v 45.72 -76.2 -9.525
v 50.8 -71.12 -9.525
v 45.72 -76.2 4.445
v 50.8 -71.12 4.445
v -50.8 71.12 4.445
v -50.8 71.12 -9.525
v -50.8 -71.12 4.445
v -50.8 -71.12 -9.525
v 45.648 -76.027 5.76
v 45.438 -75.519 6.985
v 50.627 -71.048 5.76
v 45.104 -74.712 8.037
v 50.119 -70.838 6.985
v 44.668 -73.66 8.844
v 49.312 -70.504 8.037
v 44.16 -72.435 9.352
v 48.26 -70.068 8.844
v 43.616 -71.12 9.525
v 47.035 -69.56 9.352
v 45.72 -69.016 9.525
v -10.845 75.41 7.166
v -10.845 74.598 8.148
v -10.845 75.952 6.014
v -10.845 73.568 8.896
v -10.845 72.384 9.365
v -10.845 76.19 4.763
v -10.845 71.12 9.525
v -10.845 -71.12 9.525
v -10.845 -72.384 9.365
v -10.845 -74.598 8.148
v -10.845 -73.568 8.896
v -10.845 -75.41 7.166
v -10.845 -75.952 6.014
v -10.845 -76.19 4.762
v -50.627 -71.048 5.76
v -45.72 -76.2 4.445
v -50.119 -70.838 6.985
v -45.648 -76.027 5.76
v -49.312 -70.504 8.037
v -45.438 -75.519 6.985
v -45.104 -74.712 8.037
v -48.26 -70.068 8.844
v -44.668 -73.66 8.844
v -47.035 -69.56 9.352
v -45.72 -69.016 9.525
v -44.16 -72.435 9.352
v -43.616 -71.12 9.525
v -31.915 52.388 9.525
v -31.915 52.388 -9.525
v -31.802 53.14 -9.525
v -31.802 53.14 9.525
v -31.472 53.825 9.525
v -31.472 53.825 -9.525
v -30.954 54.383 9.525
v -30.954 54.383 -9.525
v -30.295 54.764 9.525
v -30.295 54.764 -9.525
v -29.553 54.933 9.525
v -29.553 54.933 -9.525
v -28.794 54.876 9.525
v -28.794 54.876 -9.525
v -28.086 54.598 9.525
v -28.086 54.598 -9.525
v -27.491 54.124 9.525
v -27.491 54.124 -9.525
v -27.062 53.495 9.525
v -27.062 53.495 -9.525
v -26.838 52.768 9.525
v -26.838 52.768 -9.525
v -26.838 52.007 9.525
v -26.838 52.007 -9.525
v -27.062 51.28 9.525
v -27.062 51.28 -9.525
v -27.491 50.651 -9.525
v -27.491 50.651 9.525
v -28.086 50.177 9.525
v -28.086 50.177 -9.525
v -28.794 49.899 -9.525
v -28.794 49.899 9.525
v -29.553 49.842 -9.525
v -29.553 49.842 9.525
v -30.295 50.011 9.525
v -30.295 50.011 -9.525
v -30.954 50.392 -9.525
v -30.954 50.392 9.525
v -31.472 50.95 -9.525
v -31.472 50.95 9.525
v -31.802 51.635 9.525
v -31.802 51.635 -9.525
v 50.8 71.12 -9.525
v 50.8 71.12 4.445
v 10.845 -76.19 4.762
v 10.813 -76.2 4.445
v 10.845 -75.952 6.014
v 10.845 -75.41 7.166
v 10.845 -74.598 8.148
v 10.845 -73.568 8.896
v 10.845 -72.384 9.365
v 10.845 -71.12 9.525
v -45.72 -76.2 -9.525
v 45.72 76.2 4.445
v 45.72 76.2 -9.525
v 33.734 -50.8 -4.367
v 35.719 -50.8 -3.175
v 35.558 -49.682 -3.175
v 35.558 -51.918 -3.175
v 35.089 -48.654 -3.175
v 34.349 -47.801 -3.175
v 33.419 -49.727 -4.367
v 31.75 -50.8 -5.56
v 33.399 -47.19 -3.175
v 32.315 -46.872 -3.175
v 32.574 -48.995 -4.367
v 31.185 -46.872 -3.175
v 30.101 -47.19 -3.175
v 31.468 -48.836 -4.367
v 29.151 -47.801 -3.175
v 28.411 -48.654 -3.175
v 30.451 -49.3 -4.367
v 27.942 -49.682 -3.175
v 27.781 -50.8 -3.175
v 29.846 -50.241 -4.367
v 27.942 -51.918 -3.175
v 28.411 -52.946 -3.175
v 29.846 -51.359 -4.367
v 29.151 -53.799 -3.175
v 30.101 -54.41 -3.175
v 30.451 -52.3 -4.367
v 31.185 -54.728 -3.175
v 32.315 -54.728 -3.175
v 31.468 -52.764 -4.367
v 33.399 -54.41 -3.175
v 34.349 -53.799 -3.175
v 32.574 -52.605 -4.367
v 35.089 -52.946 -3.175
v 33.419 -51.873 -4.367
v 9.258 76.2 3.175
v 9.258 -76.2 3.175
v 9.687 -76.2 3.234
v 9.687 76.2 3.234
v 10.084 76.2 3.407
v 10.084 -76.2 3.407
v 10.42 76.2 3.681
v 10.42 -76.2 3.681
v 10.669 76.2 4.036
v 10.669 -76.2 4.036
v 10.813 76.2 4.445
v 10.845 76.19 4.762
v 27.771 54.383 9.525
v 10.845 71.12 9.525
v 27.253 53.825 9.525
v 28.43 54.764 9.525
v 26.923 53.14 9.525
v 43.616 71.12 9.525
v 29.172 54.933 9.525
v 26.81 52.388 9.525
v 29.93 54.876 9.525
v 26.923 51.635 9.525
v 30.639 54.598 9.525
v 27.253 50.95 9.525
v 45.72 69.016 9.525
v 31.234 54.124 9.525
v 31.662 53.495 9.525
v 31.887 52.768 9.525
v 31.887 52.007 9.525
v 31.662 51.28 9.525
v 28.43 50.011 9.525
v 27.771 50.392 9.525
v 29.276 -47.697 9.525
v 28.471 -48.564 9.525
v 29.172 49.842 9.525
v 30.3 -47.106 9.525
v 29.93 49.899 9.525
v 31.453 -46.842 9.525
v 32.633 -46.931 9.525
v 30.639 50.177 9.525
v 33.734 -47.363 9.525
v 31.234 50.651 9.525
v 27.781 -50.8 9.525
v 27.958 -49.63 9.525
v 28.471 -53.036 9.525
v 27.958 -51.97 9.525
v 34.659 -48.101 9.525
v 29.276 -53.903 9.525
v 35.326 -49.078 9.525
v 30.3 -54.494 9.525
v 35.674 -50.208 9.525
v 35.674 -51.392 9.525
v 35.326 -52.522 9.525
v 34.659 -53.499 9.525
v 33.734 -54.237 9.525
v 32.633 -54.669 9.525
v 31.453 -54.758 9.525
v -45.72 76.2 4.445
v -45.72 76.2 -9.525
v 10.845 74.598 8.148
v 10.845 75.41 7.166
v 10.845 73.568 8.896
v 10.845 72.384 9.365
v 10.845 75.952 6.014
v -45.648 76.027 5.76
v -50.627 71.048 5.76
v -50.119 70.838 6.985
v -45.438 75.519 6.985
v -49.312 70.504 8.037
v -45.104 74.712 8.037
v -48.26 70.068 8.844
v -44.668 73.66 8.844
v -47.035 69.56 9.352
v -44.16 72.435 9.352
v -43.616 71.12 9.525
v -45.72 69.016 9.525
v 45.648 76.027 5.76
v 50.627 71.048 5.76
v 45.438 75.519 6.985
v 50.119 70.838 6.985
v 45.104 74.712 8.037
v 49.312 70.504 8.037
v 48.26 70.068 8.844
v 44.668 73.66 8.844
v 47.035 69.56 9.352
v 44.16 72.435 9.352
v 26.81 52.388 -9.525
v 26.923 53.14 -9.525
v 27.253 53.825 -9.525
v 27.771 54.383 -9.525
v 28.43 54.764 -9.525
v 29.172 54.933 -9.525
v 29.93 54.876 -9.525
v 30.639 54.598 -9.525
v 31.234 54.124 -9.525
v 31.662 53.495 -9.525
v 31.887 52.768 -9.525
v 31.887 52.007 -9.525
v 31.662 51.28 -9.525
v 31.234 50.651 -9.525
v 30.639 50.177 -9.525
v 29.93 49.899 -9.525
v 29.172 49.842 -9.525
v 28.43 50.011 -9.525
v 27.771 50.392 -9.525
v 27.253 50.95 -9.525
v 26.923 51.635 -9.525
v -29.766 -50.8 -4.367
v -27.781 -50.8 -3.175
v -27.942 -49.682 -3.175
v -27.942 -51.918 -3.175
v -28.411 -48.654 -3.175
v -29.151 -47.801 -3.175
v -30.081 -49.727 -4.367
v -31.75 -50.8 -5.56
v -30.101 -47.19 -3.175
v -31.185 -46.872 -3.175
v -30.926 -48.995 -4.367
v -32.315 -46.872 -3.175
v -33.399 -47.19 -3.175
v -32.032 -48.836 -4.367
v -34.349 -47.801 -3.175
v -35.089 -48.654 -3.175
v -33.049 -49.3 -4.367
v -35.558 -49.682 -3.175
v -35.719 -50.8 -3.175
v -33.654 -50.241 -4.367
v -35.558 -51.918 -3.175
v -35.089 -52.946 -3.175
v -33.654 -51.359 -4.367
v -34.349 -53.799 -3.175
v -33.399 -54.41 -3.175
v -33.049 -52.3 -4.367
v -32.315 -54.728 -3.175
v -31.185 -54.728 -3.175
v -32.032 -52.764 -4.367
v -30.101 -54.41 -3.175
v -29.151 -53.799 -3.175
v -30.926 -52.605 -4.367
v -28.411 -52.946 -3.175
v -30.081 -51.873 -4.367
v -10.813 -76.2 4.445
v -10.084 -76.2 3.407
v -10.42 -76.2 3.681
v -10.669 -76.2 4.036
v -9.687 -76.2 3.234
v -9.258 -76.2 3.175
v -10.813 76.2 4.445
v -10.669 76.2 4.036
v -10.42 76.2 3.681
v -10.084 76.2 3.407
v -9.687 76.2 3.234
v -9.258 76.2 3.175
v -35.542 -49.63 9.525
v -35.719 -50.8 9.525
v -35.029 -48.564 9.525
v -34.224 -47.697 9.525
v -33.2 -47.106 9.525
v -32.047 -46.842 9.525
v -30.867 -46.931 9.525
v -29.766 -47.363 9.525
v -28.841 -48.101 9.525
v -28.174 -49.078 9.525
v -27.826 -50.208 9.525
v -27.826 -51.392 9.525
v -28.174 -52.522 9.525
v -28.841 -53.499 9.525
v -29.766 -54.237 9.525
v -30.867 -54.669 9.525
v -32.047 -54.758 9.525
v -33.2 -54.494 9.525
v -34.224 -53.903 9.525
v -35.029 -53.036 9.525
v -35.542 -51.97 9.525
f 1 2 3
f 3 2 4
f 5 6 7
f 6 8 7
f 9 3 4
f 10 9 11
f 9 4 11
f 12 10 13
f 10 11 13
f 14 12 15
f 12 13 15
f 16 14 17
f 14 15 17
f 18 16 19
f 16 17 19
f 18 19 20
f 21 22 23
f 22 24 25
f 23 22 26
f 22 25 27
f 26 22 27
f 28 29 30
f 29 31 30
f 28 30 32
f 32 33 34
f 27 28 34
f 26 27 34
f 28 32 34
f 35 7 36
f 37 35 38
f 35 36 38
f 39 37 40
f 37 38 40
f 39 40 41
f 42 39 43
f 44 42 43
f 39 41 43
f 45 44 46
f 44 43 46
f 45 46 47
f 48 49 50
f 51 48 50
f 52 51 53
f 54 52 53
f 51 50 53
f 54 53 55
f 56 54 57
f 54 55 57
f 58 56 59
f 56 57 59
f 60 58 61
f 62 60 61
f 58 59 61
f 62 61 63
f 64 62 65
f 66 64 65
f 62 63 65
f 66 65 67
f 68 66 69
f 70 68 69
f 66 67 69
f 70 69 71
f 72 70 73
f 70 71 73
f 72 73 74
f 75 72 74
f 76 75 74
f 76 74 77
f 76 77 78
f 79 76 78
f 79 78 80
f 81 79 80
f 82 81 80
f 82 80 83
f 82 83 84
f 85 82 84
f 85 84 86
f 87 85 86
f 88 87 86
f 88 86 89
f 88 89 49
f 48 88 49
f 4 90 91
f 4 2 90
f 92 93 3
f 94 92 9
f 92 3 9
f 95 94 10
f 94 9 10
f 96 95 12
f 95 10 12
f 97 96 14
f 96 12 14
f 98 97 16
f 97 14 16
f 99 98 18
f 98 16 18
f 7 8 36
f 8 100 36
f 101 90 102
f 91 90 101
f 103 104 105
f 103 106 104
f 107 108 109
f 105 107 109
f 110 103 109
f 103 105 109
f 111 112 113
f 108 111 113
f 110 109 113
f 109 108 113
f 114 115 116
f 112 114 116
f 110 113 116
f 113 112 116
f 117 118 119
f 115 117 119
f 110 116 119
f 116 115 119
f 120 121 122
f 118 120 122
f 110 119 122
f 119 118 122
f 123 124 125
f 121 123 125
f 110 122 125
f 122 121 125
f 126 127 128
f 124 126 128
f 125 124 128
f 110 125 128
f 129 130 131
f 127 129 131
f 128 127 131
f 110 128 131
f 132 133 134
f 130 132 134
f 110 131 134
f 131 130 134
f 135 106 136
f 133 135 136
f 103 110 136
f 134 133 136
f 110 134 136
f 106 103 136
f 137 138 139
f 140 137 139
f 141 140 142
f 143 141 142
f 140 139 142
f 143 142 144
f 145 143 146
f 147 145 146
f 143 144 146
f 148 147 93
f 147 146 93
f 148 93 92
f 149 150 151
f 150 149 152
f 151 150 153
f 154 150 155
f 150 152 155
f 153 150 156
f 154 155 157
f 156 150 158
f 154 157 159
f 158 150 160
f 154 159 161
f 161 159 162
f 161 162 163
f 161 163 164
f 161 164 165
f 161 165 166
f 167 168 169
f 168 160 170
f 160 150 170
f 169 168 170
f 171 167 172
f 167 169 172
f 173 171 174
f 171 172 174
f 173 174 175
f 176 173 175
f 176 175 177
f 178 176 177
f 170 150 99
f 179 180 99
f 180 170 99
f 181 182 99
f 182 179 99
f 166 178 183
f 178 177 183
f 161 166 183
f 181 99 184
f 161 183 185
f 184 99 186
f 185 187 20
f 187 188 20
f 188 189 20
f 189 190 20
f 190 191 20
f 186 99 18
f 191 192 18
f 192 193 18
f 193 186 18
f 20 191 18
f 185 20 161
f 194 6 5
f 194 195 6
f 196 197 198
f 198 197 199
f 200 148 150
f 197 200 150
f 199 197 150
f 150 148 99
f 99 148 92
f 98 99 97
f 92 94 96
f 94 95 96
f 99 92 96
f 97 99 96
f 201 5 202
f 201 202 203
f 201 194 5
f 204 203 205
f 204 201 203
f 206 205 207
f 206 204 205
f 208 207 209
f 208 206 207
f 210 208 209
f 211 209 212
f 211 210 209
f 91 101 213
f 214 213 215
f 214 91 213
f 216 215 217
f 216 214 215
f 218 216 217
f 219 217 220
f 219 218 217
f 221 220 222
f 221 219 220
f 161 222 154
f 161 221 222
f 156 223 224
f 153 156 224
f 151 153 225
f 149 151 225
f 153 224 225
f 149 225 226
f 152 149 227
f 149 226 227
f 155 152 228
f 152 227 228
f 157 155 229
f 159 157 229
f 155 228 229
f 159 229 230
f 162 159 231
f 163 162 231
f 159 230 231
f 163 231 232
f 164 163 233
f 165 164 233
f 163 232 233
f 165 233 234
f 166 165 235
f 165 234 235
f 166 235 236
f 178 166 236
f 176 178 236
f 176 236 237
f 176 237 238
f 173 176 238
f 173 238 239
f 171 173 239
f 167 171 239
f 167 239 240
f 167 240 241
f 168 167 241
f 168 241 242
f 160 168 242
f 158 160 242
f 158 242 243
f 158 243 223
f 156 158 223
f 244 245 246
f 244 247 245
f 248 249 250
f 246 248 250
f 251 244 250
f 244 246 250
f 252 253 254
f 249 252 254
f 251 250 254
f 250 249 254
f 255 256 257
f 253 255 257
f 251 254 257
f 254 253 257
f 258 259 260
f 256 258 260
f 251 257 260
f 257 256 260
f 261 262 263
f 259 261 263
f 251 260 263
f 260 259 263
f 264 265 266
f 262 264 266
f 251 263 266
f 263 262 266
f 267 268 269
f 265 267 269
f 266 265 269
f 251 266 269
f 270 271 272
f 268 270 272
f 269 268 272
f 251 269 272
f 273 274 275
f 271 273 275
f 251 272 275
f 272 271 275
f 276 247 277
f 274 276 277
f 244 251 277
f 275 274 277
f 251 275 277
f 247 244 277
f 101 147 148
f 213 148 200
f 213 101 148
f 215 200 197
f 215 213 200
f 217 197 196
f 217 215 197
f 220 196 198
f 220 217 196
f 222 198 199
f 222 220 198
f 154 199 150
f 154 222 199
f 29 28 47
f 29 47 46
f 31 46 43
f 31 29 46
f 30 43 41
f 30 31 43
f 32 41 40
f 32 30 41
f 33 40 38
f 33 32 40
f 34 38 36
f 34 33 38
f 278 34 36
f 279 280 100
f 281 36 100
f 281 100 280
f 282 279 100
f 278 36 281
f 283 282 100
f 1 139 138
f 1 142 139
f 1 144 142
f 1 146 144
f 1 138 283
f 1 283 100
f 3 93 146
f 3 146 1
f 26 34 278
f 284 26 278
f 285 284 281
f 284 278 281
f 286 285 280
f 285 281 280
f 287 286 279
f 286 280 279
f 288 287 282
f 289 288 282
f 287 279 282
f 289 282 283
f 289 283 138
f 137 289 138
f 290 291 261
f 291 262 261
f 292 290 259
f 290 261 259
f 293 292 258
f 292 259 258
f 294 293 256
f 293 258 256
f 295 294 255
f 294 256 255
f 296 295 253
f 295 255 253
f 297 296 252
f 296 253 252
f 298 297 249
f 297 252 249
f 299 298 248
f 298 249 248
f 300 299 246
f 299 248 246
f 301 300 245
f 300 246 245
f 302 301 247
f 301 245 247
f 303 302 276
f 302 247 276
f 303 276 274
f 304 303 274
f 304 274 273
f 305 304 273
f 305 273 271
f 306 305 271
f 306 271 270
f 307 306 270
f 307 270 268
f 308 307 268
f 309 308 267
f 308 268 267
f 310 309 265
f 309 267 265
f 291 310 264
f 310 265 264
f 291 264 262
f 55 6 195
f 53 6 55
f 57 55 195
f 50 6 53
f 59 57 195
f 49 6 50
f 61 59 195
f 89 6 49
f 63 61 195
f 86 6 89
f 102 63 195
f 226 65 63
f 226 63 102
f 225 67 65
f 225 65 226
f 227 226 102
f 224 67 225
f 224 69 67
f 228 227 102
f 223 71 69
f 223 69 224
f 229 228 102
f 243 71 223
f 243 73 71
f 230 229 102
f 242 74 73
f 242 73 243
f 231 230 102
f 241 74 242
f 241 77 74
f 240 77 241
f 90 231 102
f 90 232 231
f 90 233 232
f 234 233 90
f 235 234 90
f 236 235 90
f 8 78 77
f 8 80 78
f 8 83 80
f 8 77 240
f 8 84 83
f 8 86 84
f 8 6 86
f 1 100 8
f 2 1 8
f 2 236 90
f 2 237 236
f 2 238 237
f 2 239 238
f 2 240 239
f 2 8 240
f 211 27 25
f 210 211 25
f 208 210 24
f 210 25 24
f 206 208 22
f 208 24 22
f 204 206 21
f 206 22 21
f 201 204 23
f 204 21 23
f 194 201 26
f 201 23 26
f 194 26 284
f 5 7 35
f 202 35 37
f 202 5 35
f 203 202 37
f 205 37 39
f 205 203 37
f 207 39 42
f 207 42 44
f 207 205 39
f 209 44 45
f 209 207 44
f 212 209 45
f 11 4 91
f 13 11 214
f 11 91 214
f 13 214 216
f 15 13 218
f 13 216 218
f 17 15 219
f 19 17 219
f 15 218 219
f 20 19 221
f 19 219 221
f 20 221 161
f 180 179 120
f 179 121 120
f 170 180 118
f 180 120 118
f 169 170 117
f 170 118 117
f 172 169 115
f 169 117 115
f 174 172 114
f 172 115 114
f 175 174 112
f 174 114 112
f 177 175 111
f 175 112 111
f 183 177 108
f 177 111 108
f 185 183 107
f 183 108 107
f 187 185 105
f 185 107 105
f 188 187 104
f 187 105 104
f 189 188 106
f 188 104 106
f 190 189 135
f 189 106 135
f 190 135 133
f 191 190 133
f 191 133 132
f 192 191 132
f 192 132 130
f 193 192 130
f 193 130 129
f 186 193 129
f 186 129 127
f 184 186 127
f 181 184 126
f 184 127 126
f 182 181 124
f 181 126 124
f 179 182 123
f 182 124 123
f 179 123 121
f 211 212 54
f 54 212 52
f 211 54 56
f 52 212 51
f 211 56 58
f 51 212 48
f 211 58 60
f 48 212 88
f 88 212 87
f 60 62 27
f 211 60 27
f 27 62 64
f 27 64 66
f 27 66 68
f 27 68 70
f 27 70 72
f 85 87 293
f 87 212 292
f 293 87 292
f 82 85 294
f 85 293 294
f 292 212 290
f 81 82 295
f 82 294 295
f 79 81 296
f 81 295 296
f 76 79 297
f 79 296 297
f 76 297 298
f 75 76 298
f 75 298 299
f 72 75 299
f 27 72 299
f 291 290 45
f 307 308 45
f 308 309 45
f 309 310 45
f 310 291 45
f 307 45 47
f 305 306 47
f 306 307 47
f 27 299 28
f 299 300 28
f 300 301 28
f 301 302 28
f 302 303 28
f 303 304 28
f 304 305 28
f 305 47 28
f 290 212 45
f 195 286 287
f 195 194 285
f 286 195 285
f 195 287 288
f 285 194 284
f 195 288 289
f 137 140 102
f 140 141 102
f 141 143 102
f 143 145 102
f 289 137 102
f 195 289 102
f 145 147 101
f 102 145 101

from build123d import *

# Parameters (mm, degrees)
F0_W     = 101.6
F0_H     = 19.05
F1_DEPTH = 76.2
F3_D     = 7.9375
F3_DEPTH = 12.7
F3_TIP   = 2.3846655818
F5_DEPTH = 152.401
F7_D     = 5.1054
F8_SIZE  = 5.08
F9_R     = 5.08


with BuildPart() as f1:
    # F0 (on Front) → F1 (new body, symmetric)
    with BuildSketch(Plane.XZ):
        Rectangle(F0_W, F0_H)
    extrude(amount=F1_DEPTH, both=True)

    # F3
    with Locations(Plane.XY.offset(9.525)):
        with Locations((-31.75, -50.8), (31.75, -50.8)):
            Hole(F3_D / 2, depth=F3_DEPTH)
            with Locations((0, 0, -(F3_DEPTH + F3_TIP / 2))):  # 118° drill point
                Cone(0, F3_D / 2, F3_TIP, mode=Mode.SUBTRACT)

    # F4 (on face) → F5 (cut, through all)
    with BuildSketch(Plane.XZ.offset(76.2)):
        with BuildLine():
            Line((10.8450762928, 9.525), (-10.8450762928, 9.525))
            Line((-10.8450762928, 9.525), (-10.8450762928, 4.7625))
            ThreePointArc((-10.8450762928, 4.7625), (-10.3801083079, 3.6399679849), (-9.2575762928, 3.175))
            Line((-9.2575762928, 3.175), (9.2575762928, 3.175))
            ThreePointArc((9.2575762928, 3.175), (10.3801083079, 3.6399679849), (10.8450762928, 4.7625))
            Line((10.8450762928, 4.7625), (10.8450762928, 9.525))
        make_face()
    extrude(amount=-F5_DEPTH, mode=Mode.SUBTRACT)

    # F7 (through all)
    with Locations(Plane.XY.offset(9.525)):
        with Locations((-29.3624, 52.3875), (29.3624, 52.3875)):
            Hole(F7_D / 2)

    # F8
    f8_edges = [f1.edges().sort_by_distance(p)[0] for p in [
        (50.8, 76.2, 0),
        (50.8, -76.2, 0),
        (-50.8, -76.2, 0),
        (-50.8, 76.2, 0),
    ]]
    chamfer(f8_edges, length=F8_SIZE)

    # F9
    f9_edges = [f1.edges().sort_by_distance(p)[0] for p in [
        (-48.26, 73.66, 9.525),
        (-28.282538, 76.2, 9.525),
        (-48.26, -73.66, 9.525),
        (48.26, -73.66, 9.525),
        (48.26, 73.66, 9.525),
        (50.8, 0, 9.525),
        (-50.8, 0, 9.525),
        (-28.282538, -76.2, 9.525),
        (28.282538, -76.2, 9.525),
        (28.282538, 76.2, 9.525),
    ]]
    fillet(f9_edges, radius=F9_R)


solid = f1.part
